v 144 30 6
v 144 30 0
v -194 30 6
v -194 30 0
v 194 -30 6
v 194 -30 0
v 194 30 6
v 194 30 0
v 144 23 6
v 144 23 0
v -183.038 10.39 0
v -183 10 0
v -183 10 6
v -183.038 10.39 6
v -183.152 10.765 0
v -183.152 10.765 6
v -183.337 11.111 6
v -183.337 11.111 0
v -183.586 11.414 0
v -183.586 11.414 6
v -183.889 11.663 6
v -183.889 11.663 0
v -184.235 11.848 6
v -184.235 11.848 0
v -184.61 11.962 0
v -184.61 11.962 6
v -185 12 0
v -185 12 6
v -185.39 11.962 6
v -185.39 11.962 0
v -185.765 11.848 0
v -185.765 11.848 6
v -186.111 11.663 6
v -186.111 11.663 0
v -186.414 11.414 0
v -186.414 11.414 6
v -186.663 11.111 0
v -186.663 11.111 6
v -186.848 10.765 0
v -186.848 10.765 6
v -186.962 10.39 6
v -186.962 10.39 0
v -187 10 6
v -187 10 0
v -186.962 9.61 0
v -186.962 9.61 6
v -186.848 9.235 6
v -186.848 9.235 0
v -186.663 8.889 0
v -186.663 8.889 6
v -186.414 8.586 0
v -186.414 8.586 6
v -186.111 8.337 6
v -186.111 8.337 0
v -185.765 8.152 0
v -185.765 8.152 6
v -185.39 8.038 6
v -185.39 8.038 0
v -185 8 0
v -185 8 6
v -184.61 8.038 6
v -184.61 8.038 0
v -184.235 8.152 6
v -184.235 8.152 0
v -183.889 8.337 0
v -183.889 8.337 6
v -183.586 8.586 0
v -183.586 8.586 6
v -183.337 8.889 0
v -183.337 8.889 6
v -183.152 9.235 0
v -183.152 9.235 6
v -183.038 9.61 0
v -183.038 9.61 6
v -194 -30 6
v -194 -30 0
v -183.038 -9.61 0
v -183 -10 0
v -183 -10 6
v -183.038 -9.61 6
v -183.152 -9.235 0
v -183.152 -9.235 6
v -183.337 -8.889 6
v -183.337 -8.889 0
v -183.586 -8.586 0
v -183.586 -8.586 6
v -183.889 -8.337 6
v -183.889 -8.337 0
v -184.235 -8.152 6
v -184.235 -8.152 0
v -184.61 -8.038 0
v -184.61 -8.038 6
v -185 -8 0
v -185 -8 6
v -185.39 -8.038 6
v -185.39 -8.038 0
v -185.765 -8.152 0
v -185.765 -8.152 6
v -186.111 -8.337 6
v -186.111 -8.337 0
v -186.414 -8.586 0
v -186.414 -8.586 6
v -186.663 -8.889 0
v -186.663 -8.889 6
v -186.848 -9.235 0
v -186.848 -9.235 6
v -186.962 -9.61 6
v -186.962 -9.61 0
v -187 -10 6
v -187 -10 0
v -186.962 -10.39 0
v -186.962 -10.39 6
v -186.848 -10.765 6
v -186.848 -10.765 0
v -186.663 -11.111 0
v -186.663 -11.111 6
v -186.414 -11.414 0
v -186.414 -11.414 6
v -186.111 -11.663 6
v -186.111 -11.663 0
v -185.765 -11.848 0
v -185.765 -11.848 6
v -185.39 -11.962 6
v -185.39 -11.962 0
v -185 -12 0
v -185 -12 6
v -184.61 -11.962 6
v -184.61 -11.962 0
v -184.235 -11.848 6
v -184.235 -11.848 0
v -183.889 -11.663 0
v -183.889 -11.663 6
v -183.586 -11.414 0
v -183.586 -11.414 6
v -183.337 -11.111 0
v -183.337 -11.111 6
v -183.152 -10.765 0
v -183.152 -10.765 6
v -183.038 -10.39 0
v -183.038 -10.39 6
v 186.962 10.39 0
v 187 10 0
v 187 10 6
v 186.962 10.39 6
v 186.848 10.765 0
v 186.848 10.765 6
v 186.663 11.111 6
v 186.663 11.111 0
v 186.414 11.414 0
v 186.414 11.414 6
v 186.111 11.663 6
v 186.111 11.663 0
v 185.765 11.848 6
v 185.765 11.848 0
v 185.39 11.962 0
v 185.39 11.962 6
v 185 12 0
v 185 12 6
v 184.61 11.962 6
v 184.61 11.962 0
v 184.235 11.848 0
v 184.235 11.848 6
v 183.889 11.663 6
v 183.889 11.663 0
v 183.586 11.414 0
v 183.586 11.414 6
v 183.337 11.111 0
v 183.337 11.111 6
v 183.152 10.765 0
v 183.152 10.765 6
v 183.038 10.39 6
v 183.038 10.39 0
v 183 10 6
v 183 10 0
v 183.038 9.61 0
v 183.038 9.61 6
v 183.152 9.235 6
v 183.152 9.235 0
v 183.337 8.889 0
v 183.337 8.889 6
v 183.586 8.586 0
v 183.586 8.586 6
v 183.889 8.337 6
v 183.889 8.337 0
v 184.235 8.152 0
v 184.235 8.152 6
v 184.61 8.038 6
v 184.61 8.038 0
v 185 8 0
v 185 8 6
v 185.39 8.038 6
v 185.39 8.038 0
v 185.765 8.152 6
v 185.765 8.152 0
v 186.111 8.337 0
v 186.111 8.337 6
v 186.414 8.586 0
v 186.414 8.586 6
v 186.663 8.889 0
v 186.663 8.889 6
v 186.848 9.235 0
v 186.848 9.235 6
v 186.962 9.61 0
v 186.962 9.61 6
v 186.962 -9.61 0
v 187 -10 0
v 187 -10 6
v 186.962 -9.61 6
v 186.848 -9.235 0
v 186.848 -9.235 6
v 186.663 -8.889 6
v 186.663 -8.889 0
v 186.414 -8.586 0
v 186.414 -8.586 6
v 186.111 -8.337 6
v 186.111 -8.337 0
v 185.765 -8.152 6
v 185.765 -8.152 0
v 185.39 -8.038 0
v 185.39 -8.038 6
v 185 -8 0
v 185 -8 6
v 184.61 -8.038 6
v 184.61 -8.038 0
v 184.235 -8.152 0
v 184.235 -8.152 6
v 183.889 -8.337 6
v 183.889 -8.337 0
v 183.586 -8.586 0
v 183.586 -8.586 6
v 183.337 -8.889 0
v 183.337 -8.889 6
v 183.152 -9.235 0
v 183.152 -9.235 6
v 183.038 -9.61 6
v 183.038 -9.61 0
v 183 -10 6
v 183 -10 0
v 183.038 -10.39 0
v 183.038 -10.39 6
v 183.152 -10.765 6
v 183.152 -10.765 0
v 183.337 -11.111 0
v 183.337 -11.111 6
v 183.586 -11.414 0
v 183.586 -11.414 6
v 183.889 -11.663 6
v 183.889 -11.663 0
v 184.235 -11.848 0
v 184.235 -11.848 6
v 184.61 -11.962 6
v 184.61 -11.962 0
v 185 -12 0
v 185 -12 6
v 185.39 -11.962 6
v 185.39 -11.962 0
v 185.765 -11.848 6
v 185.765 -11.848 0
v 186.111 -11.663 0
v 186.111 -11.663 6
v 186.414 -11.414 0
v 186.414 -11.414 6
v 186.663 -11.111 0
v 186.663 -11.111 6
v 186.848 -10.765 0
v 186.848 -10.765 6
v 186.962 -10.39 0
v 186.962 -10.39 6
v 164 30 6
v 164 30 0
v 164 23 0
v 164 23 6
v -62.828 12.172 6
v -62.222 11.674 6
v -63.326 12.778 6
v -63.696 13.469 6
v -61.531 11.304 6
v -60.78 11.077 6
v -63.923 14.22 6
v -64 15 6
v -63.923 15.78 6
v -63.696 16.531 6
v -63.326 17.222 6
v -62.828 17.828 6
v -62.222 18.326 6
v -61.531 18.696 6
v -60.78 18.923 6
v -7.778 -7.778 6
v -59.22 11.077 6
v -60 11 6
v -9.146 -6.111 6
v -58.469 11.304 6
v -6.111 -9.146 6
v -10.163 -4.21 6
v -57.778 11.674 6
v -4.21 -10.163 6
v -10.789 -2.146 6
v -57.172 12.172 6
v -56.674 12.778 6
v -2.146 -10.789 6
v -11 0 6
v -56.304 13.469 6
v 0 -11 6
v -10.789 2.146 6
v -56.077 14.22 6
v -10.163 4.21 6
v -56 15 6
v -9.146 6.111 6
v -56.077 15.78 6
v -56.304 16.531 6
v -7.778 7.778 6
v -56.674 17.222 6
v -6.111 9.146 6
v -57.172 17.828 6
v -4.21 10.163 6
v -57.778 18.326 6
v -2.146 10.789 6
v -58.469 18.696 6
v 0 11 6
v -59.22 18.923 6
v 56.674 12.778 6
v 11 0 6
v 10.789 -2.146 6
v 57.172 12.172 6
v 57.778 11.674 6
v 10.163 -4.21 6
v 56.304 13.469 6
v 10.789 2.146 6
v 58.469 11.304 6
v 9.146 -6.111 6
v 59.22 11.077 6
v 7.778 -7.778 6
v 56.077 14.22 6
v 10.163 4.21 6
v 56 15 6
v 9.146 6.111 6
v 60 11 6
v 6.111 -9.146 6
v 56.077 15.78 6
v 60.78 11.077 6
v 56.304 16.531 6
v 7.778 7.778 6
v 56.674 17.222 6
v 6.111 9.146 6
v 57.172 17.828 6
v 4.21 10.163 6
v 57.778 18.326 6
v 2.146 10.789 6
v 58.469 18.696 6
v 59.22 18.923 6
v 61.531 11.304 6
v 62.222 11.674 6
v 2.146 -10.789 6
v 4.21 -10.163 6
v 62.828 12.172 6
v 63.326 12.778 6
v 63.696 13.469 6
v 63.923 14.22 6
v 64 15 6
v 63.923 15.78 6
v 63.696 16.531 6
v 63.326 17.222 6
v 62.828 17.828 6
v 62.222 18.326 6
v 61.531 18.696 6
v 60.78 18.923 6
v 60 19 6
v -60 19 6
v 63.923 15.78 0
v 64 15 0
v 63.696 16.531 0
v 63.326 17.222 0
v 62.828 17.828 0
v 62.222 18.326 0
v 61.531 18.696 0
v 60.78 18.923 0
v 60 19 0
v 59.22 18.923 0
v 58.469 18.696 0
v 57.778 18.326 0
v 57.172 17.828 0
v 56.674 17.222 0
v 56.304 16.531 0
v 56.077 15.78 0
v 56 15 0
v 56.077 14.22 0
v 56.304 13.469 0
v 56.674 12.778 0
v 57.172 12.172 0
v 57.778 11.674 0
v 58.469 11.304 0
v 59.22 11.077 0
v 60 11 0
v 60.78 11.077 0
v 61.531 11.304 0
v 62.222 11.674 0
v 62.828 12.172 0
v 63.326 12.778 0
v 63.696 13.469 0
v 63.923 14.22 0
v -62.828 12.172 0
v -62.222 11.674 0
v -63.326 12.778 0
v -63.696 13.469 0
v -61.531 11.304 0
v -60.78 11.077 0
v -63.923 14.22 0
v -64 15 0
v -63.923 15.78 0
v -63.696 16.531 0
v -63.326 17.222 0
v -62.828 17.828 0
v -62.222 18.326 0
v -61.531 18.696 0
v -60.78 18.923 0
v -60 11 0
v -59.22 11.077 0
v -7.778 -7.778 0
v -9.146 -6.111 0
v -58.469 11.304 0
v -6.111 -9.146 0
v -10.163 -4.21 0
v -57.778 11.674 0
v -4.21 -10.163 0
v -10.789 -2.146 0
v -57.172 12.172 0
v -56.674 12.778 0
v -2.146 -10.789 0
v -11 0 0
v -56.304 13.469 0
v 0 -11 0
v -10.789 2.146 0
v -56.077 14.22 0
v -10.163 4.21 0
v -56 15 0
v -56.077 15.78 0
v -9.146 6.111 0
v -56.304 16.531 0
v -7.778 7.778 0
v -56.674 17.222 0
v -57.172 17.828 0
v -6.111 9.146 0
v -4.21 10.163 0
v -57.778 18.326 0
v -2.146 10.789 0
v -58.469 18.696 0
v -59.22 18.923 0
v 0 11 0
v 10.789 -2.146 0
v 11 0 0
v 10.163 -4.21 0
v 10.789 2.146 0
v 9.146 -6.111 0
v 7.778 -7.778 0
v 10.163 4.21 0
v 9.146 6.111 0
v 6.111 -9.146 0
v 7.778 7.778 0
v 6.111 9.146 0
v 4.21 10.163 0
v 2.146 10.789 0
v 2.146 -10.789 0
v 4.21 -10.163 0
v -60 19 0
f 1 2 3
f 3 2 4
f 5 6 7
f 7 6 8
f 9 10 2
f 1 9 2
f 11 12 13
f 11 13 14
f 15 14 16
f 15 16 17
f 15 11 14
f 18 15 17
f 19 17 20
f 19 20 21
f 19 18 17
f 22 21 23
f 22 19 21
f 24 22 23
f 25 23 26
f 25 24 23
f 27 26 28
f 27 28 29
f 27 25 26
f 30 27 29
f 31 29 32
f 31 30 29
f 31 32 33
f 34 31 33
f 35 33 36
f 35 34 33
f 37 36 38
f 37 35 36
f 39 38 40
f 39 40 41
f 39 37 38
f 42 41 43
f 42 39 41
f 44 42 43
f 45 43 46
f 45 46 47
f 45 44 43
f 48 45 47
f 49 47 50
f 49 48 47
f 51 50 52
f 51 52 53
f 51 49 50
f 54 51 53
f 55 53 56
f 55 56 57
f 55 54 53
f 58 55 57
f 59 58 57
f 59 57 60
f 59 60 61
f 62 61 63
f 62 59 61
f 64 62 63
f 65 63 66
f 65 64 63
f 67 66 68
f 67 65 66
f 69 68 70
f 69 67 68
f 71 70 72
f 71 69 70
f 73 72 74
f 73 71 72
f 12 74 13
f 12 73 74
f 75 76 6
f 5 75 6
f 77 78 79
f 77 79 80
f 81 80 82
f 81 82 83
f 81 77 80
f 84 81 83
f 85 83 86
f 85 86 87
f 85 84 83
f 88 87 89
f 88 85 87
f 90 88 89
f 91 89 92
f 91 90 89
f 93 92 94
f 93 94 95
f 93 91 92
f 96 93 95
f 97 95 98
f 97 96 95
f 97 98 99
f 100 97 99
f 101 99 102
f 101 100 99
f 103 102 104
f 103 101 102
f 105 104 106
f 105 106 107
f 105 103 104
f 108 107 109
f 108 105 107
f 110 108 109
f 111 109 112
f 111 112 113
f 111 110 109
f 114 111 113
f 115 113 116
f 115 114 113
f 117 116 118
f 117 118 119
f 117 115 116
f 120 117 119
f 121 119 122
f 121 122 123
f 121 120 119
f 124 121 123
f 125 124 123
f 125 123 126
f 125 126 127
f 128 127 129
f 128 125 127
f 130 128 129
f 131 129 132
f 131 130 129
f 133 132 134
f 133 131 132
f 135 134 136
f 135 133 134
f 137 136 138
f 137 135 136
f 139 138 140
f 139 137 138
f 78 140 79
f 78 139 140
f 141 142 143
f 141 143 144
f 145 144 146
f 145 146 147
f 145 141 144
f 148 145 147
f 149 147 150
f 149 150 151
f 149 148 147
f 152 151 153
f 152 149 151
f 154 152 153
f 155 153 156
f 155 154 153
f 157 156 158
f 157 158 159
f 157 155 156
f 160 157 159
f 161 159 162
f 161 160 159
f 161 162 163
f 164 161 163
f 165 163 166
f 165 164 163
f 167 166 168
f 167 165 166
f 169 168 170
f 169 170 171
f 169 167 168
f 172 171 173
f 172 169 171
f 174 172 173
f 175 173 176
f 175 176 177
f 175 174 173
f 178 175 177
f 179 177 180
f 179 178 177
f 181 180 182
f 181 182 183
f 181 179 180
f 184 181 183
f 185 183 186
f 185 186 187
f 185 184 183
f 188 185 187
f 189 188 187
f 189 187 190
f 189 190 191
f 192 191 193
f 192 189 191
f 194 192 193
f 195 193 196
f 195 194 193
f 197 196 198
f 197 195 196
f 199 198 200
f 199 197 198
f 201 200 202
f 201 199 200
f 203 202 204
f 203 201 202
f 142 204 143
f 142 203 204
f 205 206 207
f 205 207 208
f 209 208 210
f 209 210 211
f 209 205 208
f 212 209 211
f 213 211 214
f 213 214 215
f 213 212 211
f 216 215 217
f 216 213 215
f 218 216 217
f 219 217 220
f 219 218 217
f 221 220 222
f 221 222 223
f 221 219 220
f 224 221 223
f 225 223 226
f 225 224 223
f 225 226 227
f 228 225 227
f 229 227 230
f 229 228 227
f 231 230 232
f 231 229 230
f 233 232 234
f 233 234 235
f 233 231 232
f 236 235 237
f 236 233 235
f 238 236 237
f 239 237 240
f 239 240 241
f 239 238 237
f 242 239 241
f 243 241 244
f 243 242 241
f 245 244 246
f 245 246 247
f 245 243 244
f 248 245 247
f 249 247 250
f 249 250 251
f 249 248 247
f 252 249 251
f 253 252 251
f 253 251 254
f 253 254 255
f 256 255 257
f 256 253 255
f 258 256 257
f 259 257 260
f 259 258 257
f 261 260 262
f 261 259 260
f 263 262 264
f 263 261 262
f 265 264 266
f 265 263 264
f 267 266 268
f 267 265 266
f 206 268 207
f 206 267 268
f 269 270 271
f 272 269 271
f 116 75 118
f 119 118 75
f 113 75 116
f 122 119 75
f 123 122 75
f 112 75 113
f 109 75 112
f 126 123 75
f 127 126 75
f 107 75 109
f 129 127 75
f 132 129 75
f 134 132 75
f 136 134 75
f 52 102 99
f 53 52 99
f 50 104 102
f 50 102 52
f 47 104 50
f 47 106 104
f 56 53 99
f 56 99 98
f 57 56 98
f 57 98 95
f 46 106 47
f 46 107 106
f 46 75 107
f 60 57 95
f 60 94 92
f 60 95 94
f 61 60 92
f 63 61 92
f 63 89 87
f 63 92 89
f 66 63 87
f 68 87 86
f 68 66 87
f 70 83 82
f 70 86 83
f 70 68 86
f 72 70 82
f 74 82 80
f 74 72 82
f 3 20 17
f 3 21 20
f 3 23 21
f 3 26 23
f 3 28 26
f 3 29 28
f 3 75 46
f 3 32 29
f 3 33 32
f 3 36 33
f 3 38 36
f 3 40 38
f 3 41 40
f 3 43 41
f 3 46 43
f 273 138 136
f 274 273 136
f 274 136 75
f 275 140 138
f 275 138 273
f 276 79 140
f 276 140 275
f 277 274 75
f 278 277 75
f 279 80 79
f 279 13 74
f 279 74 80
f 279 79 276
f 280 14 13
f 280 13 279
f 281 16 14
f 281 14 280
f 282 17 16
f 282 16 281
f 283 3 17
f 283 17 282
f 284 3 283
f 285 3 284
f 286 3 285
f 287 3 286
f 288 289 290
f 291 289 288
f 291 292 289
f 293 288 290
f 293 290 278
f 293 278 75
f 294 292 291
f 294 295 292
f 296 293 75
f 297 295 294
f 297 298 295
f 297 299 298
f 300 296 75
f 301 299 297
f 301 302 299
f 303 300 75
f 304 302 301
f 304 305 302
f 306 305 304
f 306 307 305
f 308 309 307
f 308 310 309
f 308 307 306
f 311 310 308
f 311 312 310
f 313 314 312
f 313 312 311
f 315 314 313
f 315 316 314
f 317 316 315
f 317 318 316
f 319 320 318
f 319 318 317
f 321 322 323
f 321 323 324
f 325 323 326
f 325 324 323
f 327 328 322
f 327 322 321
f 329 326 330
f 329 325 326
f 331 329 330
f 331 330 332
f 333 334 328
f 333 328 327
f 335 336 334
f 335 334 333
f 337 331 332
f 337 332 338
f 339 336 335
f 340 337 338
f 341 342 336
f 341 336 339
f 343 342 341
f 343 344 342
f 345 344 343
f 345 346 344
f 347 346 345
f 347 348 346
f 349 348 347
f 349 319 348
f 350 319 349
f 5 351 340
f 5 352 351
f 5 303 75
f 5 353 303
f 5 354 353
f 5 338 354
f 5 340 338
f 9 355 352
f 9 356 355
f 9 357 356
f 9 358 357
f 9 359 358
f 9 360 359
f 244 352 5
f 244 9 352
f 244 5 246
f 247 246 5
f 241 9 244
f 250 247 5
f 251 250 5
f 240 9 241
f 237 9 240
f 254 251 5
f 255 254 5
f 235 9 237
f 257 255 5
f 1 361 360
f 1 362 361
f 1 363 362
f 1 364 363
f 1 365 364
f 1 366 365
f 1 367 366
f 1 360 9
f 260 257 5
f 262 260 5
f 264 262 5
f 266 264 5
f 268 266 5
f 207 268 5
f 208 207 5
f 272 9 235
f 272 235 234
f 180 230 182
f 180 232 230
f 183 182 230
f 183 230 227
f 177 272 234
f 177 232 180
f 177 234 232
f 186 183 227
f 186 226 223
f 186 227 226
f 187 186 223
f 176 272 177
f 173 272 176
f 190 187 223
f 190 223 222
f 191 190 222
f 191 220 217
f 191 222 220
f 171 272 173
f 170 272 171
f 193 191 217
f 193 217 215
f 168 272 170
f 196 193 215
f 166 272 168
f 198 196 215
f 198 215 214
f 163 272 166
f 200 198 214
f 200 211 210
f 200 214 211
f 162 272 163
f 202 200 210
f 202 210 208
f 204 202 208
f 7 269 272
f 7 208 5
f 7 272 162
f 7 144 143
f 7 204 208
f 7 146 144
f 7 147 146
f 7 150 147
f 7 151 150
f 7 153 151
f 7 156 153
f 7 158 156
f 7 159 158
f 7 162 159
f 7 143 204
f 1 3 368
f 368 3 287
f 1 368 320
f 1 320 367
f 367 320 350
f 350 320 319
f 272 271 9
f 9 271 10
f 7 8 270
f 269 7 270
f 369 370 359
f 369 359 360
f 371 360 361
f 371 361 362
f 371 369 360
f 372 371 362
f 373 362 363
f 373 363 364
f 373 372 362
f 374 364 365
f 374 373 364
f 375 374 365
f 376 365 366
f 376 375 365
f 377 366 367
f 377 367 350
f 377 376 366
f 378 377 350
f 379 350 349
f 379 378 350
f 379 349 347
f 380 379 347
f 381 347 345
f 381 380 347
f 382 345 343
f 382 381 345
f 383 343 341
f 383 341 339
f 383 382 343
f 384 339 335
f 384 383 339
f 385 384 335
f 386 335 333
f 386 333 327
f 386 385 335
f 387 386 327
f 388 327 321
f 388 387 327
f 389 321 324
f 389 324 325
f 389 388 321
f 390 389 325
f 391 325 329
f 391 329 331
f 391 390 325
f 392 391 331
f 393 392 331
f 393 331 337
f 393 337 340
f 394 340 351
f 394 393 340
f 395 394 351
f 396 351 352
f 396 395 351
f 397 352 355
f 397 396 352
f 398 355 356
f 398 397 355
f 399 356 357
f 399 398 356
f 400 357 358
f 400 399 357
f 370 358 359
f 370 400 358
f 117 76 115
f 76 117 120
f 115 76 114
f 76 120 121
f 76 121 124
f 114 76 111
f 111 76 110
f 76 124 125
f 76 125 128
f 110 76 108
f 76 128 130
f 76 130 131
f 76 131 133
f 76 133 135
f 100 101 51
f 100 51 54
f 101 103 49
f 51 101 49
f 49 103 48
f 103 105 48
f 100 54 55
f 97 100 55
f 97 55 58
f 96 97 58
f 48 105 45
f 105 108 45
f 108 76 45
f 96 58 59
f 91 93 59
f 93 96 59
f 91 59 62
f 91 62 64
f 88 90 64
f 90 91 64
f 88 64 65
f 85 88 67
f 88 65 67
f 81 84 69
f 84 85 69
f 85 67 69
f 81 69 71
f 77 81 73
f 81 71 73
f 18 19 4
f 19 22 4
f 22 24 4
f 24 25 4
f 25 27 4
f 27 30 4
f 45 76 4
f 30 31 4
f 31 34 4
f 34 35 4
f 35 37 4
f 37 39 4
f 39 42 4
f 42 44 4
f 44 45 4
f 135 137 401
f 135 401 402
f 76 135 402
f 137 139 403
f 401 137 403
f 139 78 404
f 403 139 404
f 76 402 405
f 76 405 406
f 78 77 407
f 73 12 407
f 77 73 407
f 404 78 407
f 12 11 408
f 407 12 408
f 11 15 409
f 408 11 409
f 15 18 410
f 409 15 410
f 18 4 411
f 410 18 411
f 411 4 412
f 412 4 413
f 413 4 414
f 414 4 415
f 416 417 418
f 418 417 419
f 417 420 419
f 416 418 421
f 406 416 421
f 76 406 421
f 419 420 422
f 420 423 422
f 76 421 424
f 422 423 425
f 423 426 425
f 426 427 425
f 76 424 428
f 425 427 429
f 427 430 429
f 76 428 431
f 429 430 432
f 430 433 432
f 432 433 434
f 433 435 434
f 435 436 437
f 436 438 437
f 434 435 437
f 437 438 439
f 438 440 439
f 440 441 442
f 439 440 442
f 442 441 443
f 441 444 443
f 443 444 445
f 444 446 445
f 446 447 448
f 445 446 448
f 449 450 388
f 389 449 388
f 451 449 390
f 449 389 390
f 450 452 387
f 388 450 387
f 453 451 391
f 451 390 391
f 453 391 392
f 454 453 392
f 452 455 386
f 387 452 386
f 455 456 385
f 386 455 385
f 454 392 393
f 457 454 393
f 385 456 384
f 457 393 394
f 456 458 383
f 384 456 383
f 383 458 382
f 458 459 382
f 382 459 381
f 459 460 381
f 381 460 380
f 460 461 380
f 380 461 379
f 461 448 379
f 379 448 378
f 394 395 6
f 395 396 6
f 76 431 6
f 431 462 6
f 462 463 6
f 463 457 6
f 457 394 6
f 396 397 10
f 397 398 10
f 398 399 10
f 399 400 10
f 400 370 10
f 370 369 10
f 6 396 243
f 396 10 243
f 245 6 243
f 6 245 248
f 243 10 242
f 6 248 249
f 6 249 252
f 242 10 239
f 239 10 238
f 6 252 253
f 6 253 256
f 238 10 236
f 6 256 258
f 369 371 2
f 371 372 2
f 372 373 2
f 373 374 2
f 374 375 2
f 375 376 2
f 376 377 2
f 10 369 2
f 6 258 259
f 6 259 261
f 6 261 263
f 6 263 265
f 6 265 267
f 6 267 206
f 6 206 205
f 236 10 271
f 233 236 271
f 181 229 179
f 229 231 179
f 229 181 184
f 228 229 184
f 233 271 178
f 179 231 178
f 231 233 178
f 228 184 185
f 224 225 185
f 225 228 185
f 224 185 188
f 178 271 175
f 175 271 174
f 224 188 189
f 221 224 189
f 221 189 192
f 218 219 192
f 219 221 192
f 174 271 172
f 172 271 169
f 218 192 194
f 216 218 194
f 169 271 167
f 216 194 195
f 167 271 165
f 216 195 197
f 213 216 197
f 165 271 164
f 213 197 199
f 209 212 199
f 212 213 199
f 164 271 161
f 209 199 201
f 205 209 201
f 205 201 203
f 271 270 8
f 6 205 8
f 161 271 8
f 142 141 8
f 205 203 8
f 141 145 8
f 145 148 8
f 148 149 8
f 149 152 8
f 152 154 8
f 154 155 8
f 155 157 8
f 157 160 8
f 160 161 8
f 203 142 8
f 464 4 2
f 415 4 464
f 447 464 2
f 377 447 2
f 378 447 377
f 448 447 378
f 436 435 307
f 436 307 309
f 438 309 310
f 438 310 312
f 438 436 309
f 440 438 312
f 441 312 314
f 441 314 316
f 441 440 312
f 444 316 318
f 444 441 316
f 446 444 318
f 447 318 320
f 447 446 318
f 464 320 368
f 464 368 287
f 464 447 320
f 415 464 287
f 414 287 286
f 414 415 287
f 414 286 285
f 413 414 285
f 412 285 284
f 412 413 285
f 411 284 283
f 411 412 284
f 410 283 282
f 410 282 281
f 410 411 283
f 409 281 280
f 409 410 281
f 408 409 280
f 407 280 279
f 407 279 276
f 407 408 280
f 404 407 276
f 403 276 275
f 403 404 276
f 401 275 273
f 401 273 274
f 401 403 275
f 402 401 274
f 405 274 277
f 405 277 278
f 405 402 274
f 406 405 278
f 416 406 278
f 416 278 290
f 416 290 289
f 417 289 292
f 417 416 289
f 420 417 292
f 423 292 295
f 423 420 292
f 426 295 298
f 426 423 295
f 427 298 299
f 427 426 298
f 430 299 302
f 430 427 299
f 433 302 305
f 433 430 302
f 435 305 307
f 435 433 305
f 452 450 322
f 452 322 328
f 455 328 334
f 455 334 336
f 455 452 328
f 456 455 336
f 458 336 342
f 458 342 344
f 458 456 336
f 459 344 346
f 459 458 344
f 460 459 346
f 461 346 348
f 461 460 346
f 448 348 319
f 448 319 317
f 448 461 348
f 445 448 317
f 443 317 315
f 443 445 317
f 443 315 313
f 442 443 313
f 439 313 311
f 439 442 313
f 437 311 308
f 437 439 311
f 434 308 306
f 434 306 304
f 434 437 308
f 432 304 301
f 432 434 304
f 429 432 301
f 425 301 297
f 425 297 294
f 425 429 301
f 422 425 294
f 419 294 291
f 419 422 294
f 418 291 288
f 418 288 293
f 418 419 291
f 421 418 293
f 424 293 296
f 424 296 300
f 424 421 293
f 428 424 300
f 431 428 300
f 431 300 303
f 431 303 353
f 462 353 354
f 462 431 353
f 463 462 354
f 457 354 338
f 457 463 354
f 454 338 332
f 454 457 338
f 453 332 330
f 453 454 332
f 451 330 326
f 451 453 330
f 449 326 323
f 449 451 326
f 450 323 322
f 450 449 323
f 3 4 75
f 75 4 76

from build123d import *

# Parameters (mm, degrees)
SKETCH1_R           = 2
SKETCH1_R_2         = 4
SKETCH1_R_3         = 11
BOSS_EXTRUDE1_DEPTH = 6


with BuildPart() as part:
    # Sketch1 → Boss-Extrude1 (new body)
    with BuildSketch(Plane.XY):
        Polygon((-194, 30), (-194, -30), (194, -30), (194, 30), (164, 30), (164, 23), (144, 23), (144, 30), align=None)
        with Locations((-185, -10)):
            Circle(SKETCH1_R, mode=Mode.SUBTRACT)
        with Locations((185, -10)):
            Circle(SKETCH1_R, mode=Mode.SUBTRACT)
        with Locations((-185, 10)):
            Circle(SKETCH1_R, mode=Mode.SUBTRACT)
        with Locations((-60, 15)):
            Circle(SKETCH1_R_2, mode=Mode.SUBTRACT)
        Circle(SKETCH1_R_3, mode=Mode.SUBTRACT)
        with Locations((185, 10)):
            Circle(SKETCH1_R, mode=Mode.SUBTRACT)
        with Locations((60, 15)):
            Circle(SKETCH1_R_2, mode=Mode.SUBTRACT)
    extrude(amount=BOSS_EXTRUDE1_DEPTH)


solid = part.part
